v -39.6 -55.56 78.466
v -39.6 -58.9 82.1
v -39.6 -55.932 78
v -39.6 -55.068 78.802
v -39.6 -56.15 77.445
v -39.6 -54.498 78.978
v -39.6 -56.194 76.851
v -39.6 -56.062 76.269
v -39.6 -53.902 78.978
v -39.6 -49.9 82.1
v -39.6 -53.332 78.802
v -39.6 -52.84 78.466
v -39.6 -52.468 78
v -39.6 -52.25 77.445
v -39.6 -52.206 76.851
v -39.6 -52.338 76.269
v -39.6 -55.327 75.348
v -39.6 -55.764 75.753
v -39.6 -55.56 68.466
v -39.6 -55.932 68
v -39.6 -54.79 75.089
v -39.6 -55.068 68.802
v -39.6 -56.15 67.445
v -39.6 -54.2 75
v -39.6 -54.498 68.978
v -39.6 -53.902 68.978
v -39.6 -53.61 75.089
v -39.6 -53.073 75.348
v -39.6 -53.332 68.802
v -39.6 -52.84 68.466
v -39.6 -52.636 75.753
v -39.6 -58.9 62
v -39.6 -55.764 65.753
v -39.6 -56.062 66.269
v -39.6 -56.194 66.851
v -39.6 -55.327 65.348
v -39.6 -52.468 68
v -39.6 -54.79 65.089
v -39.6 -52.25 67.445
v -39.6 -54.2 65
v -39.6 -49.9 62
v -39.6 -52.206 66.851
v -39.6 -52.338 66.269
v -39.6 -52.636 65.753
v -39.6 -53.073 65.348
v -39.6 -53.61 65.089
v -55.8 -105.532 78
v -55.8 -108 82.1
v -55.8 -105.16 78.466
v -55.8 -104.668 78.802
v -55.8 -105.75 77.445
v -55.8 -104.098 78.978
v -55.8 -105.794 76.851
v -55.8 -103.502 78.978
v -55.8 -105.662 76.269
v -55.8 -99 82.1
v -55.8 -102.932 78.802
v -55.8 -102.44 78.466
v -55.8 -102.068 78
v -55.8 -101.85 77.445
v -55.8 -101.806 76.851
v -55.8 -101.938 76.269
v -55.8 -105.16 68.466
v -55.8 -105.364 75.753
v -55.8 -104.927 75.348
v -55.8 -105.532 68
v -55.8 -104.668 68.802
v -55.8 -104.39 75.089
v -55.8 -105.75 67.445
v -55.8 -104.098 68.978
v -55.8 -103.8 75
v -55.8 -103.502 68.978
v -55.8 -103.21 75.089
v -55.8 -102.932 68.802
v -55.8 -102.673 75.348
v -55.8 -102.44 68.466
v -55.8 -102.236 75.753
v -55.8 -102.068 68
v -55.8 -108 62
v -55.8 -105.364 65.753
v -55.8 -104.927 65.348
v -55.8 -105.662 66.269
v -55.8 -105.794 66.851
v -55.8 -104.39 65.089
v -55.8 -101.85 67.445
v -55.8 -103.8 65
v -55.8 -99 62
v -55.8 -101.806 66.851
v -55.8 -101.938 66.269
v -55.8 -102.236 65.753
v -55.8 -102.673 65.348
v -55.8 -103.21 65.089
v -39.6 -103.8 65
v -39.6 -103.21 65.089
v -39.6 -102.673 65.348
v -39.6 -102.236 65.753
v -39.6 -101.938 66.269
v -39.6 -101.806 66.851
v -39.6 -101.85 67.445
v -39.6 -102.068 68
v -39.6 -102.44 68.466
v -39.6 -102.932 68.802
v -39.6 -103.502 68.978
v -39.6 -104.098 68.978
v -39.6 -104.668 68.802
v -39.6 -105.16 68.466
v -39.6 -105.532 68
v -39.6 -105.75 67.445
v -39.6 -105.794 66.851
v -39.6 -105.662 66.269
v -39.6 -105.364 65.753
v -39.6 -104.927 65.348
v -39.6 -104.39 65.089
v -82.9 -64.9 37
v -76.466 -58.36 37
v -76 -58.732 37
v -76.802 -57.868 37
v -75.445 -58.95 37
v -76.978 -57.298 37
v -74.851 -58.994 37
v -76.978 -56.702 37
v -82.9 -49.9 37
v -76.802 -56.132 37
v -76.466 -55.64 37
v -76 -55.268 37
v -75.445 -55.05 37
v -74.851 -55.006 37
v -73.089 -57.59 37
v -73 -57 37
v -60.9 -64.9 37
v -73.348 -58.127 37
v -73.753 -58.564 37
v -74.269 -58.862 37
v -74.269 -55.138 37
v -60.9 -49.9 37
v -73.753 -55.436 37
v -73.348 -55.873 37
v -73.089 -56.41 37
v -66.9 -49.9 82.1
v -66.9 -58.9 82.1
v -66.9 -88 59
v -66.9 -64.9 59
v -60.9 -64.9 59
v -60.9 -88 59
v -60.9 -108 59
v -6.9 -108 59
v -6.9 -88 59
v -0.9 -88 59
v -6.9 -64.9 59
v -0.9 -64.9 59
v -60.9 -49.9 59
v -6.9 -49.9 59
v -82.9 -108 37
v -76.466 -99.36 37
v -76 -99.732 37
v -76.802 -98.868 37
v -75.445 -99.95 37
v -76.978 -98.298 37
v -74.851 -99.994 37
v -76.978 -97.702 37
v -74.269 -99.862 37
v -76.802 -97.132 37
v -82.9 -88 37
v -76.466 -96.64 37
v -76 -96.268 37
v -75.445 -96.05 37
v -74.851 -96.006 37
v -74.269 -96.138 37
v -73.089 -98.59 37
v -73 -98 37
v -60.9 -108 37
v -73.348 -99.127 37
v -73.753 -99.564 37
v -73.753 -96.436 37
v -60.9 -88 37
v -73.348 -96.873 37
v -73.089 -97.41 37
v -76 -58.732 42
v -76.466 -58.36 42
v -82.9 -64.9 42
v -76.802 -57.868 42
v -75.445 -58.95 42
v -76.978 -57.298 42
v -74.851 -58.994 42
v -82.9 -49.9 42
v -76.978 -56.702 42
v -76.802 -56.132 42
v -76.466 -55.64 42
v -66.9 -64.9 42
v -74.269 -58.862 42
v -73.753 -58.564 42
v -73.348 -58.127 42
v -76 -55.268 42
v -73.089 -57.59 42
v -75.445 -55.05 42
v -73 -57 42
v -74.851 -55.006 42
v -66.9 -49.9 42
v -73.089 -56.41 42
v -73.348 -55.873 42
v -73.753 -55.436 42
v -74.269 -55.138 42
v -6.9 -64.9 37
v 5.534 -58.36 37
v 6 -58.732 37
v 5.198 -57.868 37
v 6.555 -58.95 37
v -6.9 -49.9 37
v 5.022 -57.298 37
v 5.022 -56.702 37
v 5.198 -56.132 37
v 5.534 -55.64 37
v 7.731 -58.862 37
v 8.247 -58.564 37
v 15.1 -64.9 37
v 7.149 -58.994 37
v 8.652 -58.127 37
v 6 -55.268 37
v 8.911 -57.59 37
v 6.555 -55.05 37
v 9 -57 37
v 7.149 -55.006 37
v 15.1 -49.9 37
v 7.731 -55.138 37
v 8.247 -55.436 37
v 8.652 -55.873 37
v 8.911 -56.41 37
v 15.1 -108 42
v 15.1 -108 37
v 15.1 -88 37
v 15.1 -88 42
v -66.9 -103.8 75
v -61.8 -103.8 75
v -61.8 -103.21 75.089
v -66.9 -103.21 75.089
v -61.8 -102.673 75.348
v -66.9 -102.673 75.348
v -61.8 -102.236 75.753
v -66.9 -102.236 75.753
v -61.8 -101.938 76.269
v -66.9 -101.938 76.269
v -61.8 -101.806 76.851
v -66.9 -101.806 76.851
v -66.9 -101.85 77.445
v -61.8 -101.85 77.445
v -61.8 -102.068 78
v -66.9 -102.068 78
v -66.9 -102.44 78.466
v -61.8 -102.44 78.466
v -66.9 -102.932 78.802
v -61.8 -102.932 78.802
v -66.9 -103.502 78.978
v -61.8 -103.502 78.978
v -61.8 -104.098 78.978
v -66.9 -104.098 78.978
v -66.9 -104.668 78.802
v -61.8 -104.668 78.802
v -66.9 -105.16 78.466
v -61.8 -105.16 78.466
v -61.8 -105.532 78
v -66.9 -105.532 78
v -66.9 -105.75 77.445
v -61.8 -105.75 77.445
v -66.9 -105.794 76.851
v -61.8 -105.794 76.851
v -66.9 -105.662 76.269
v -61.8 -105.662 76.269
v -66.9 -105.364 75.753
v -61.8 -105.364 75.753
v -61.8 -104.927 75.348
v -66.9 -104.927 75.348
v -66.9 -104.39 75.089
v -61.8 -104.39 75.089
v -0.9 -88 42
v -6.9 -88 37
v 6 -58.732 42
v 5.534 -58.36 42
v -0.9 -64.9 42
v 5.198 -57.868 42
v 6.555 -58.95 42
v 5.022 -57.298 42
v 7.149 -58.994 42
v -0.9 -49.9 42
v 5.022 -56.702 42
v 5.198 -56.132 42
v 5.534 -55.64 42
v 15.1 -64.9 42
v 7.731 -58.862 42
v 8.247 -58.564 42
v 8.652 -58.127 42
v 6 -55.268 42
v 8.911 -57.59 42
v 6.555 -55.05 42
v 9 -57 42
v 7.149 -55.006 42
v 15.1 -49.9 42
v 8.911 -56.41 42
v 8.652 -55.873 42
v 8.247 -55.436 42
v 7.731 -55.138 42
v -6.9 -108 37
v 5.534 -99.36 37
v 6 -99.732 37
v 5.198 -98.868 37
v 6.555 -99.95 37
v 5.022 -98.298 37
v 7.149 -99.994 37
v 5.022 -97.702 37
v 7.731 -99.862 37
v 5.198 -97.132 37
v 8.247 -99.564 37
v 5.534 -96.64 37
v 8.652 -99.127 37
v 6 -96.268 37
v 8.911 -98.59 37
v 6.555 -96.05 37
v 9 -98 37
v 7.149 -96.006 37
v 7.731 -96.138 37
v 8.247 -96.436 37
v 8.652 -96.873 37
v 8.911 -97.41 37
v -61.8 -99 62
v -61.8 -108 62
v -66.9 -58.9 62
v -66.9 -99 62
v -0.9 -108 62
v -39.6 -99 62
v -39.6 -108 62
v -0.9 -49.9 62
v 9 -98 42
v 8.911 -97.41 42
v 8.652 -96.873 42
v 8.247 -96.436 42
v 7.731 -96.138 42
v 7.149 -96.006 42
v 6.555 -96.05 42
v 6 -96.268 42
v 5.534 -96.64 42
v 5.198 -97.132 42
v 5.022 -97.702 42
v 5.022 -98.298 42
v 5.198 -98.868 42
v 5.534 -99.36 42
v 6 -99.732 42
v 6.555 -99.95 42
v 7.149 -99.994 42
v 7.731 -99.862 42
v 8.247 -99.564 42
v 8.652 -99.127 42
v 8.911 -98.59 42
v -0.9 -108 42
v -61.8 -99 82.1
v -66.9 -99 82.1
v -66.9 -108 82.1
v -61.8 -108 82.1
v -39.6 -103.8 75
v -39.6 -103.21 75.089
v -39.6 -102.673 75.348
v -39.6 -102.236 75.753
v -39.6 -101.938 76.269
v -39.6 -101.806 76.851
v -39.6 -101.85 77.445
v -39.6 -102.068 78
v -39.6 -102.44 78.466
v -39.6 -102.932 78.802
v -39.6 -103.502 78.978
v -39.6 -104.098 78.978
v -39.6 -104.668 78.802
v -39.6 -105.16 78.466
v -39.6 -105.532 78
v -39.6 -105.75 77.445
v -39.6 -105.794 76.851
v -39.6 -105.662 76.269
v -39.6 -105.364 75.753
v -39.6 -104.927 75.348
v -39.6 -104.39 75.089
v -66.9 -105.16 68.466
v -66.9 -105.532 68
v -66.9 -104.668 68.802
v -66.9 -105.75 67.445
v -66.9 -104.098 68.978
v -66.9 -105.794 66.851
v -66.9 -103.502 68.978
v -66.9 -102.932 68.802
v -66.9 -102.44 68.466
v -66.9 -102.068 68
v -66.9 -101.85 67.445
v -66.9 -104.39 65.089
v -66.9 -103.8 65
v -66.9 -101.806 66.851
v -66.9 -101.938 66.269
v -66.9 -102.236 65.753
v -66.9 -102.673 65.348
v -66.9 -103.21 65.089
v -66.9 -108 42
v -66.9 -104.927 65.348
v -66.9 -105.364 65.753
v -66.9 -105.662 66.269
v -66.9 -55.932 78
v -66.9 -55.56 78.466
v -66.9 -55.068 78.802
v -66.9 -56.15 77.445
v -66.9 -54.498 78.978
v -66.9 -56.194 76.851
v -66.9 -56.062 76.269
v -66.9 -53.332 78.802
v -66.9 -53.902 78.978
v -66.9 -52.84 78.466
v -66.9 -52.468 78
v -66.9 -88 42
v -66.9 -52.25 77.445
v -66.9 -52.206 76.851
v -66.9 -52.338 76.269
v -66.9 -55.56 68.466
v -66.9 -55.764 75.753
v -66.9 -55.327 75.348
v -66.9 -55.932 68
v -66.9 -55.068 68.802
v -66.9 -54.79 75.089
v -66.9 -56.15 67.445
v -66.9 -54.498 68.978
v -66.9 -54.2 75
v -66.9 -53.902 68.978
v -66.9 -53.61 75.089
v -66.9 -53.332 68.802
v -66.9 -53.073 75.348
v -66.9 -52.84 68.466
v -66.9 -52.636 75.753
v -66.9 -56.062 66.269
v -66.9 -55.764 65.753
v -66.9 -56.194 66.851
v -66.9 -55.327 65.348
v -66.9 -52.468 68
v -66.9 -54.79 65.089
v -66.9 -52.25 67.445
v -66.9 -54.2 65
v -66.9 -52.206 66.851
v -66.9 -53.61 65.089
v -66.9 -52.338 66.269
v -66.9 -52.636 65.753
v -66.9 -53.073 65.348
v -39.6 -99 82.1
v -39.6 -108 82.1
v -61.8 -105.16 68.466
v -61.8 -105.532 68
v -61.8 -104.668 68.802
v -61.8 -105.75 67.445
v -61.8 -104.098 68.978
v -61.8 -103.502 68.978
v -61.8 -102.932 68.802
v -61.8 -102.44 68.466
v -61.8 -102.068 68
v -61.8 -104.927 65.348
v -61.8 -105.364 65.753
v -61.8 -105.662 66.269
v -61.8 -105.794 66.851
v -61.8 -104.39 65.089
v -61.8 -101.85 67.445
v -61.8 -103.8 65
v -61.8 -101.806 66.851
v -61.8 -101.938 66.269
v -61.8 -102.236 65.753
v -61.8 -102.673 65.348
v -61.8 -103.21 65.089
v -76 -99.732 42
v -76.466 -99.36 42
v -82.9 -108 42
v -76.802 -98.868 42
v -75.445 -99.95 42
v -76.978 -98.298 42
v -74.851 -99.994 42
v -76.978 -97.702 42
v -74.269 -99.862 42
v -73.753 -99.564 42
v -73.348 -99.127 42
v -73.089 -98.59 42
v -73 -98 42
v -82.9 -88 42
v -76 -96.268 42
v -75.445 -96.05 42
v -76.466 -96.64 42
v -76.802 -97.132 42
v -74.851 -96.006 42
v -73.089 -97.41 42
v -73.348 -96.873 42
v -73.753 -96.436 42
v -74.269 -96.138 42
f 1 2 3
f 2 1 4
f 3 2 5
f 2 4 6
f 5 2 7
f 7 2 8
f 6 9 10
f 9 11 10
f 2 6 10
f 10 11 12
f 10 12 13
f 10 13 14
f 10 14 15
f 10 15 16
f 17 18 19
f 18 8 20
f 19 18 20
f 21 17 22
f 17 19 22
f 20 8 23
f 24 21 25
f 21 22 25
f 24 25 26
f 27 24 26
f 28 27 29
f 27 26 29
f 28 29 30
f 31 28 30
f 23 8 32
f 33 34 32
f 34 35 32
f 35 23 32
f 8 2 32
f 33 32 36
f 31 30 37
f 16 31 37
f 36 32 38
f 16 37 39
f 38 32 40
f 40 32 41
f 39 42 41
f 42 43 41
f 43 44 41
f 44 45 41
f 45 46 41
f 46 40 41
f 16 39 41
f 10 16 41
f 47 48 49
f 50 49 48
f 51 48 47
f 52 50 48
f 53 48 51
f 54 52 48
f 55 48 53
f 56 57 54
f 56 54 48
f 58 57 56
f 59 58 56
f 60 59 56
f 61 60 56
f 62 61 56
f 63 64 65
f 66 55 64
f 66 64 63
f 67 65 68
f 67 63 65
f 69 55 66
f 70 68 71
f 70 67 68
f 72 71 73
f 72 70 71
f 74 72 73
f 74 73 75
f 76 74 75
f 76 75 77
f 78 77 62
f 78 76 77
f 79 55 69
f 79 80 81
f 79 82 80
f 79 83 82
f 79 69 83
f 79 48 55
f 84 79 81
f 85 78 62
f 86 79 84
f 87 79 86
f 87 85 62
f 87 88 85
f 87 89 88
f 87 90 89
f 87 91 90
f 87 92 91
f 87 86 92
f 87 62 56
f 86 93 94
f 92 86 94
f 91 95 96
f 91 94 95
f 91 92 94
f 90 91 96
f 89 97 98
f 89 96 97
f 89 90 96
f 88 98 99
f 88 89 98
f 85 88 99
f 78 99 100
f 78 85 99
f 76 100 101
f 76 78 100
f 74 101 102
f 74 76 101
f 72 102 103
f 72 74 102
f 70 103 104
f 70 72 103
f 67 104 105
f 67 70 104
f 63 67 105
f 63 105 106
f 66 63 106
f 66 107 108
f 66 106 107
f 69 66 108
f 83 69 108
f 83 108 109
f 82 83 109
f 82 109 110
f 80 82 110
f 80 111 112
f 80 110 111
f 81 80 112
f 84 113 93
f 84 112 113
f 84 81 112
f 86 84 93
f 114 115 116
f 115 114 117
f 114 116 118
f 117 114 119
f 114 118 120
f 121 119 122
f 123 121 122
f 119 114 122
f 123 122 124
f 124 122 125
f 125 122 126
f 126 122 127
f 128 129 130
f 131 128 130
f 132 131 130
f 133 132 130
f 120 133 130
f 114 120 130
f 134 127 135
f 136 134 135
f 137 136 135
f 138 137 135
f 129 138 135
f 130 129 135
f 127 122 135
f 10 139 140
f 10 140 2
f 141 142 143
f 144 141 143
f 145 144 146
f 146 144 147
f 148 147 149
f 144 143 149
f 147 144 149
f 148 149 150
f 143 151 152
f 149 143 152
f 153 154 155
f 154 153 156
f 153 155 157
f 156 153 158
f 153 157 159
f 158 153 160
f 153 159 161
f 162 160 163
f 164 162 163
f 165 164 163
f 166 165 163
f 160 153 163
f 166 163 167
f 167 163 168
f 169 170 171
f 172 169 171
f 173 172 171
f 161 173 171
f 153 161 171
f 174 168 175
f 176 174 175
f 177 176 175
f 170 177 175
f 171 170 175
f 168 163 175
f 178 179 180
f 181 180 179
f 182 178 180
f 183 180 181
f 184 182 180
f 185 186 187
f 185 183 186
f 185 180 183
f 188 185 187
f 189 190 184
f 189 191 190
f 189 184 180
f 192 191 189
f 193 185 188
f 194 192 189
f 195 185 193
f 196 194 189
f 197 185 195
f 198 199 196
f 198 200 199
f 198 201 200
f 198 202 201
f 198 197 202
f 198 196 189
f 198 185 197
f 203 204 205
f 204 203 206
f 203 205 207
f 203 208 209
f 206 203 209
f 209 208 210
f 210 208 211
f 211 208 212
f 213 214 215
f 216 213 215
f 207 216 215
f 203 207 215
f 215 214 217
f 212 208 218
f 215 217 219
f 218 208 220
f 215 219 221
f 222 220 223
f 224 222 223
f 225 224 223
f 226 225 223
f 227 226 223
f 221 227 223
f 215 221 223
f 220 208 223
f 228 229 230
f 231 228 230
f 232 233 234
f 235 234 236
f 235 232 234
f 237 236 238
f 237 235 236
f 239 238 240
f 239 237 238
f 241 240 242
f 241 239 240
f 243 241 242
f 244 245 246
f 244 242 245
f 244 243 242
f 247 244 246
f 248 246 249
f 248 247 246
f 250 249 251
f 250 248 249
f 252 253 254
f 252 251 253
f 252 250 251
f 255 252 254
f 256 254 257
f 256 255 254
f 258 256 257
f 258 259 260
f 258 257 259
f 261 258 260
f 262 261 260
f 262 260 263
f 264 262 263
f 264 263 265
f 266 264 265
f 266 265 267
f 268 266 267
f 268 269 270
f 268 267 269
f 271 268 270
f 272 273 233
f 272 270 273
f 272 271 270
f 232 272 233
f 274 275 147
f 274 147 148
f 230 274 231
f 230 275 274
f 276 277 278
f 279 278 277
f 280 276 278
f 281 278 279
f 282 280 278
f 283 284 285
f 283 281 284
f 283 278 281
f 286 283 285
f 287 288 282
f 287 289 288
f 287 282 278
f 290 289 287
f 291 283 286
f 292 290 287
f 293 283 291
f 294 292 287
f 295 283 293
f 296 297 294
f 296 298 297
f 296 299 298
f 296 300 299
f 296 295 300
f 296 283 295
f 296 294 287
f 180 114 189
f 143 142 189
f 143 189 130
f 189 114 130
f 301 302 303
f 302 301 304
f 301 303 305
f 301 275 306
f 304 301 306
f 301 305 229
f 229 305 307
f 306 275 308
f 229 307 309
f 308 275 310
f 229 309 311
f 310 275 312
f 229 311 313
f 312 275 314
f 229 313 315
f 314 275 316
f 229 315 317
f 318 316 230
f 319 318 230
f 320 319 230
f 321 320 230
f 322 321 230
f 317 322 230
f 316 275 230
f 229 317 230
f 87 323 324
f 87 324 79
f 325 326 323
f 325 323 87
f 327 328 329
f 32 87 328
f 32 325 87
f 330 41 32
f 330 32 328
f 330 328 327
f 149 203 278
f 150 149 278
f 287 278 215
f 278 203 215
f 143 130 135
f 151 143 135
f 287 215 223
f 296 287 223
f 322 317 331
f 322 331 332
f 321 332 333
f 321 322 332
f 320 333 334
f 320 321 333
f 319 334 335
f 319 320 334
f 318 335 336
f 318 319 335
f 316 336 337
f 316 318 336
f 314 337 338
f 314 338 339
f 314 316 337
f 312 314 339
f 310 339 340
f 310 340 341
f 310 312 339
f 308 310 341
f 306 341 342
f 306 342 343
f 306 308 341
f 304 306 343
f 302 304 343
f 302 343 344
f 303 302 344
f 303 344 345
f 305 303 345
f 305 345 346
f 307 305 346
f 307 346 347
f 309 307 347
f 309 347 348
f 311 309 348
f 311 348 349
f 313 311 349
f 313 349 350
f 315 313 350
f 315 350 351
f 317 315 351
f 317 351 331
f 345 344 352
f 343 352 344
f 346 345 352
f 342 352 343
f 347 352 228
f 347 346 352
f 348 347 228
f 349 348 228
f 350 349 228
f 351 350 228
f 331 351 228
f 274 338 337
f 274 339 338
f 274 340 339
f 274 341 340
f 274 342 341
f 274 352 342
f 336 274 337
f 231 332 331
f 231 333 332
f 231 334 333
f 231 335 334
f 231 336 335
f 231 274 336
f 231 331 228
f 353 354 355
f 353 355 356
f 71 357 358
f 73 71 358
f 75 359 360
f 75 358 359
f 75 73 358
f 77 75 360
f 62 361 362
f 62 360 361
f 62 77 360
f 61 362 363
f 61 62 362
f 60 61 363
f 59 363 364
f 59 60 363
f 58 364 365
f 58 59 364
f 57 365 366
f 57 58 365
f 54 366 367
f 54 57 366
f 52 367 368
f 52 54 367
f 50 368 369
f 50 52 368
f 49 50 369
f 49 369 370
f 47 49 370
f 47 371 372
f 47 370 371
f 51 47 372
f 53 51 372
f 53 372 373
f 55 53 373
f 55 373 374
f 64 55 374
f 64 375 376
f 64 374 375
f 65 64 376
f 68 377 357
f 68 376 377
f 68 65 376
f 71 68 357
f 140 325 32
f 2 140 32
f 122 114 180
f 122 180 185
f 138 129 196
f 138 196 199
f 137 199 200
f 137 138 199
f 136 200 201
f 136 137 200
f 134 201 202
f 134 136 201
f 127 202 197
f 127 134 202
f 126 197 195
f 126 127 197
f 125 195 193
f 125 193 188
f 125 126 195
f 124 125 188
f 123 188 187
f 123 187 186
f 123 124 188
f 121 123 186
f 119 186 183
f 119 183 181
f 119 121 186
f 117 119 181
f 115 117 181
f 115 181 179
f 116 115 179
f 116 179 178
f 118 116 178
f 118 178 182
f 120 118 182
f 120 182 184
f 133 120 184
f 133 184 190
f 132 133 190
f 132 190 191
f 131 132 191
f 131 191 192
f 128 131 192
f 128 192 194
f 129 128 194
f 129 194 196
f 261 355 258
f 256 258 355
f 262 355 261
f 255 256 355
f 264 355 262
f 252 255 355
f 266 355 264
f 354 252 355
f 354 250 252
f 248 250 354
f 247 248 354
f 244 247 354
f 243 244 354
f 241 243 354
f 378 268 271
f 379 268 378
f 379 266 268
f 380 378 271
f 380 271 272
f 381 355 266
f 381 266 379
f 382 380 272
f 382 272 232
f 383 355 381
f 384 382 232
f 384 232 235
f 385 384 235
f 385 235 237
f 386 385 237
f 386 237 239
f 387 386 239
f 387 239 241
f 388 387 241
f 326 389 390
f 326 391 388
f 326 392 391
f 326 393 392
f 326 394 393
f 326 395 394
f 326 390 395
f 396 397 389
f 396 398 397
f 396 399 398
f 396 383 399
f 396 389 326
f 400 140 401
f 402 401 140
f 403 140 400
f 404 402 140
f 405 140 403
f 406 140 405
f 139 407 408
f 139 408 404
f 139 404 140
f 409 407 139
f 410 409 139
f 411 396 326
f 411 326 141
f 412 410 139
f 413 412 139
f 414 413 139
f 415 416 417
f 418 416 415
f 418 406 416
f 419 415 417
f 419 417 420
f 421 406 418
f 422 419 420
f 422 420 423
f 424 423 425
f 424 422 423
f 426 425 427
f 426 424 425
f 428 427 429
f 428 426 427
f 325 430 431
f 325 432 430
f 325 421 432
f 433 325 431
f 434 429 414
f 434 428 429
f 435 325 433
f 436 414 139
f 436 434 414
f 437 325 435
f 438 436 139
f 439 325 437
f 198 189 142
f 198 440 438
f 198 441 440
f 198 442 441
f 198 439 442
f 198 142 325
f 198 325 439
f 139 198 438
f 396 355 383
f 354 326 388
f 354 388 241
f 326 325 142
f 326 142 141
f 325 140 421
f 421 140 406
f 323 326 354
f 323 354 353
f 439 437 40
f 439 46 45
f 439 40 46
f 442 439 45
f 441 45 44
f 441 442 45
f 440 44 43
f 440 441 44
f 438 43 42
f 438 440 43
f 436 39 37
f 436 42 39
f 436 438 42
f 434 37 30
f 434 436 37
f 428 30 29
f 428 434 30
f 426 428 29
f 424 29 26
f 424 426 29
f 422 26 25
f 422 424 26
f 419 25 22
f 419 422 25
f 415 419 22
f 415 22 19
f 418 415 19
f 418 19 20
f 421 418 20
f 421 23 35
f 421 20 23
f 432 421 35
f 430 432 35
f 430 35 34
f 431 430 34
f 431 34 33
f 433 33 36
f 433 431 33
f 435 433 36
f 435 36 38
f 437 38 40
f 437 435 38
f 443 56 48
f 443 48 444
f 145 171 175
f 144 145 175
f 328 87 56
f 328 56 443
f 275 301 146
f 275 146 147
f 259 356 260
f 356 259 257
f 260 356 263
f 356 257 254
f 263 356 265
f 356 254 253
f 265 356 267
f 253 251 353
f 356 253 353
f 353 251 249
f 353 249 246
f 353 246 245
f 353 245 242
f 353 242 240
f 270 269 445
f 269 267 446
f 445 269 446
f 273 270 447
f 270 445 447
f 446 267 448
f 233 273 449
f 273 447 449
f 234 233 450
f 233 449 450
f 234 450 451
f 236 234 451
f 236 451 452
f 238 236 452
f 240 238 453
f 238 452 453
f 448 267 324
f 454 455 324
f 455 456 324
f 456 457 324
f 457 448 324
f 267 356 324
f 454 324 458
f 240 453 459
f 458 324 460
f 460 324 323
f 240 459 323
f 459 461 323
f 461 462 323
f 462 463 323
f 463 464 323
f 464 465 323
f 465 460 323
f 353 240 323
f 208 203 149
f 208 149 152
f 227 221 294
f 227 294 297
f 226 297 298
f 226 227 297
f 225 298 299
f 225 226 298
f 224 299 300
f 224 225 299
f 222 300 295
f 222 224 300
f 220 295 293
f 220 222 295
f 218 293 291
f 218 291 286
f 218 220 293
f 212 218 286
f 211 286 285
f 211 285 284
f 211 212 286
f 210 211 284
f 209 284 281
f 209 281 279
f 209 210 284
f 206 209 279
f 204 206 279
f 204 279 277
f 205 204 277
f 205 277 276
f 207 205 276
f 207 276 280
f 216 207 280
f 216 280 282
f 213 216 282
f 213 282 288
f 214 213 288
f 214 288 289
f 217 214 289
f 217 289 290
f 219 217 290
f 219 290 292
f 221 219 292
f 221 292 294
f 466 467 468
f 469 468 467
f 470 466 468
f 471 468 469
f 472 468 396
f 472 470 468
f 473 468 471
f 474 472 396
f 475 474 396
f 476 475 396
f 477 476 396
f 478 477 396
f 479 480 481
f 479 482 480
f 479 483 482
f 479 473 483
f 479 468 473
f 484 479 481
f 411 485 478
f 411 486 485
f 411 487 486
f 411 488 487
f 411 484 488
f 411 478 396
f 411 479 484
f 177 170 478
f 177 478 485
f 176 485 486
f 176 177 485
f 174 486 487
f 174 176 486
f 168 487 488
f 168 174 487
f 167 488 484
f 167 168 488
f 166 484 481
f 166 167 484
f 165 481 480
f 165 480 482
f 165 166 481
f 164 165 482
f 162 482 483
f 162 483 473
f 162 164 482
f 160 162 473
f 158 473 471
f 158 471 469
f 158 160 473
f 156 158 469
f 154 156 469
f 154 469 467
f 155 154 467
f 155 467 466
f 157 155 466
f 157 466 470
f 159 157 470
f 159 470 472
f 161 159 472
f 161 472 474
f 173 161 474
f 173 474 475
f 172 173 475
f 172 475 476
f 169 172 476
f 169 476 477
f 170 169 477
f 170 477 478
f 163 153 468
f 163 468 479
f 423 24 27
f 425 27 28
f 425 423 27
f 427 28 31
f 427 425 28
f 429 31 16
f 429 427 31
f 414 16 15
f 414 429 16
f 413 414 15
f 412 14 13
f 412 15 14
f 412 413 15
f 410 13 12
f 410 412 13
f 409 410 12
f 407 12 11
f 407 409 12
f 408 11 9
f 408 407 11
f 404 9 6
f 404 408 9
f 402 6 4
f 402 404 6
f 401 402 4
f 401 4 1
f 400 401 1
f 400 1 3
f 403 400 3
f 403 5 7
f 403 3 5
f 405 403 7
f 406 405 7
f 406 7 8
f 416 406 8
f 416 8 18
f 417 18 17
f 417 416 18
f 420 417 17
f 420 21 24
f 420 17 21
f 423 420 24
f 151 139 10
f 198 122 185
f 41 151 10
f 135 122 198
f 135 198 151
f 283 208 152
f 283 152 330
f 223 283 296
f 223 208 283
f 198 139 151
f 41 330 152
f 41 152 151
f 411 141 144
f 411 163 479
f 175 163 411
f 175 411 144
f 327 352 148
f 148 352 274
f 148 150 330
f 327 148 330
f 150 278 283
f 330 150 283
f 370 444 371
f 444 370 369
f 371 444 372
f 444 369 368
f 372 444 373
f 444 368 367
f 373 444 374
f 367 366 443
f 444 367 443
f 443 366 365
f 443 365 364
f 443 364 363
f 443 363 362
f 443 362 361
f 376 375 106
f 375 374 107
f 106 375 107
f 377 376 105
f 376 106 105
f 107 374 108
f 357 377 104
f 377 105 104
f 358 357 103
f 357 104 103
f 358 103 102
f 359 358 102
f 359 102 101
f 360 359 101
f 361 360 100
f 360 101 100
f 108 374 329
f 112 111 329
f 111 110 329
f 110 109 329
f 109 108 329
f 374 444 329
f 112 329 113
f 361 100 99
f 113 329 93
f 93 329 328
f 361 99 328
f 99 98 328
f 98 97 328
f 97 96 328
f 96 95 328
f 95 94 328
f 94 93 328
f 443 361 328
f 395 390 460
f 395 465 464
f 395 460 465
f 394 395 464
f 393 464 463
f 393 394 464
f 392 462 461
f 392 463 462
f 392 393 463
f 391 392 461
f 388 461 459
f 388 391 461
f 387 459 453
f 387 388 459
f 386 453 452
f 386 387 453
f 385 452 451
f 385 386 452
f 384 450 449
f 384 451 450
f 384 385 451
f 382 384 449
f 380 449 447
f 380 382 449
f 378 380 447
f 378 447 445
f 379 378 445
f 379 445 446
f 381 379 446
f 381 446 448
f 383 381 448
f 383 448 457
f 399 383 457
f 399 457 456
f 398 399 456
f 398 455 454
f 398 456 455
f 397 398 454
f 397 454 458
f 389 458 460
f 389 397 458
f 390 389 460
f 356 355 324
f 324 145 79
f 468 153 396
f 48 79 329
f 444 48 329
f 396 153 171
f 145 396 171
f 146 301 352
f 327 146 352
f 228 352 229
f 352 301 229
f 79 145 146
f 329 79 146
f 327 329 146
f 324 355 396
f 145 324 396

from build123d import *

# Parameters (mm, degrees)
CYLINDER324_R     = 2
CYLINDER324_DEPTH = 47
CYLINDER323_R     = 2
CYLINDER323_DEPTH = 47
BOX411_W          = 6
BOX411_H          = 15
BOX411_DEPTH      = 25
BOX409_W          = 6
BOX409_H          = 15
BOX409_DEPTH      = 25
BOX410_W          = 16
BOX410_H          = 15
BOX410_DEPTH      = 5
BOX412_W          = 16
BOX412_H          = 15
BOX412_DEPTH      = 5
BOX430_W          = 6
BOX430_H          = 9
BOX430_DEPTH      = 20.1
CYLINDER180_R     = 2
CYLINDER180_DEPTH = 33
CYLINDER179_R     = 2
CYLINDER179_DEPTH = 30
CYLINDER182_R     = 2
CYLINDER182_DEPTH = 33
CYLINDER181_R     = 2
CYLINDER181_DEPTH = 30
BOX281_W          = 27.3
BOX281_H          = 9
BOX281_DEPTH      = 20.1
BOX408_W          = 27.3
BOX408_H          = 9
BOX408_DEPTH      = 20.1
BOX283_W          = 66
BOX283_H          = 58.1
BOX283_DEPTH      = 3
CYLINDER326_R     = 2
CYLINDER326_DEPTH = 47
CYLINDER325_R     = 2
CYLINDER325_DEPTH = 47
BOX286_W          = 6
BOX286_H          = 20
BOX286_DEPTH      = 25
BOX407_W          = 16
BOX407_H          = 20
BOX407_DEPTH      = 5
BOX288_W          = 6
BOX288_H          = 20
BOX288_DEPTH      = 25
BOX406_W          = 16
BOX406_H          = 20
BOX406_DEPTH      = 5


with BuildPart() as cylinder324:
    # Cylinder324 → Cylinder324 (new body)
    with BuildSketch(Plane(origin=(-75, -98, -5), x_dir=(1, 0, 0), z_dir=(0, 0, 1))):
        Circle(CYLINDER324_R)
    extrude(amount=CYLINDER324_DEPTH)


with BuildPart() as fusion314:
    # Cylinder323 → Cylinder323 (new body)
    with BuildSketch(Plane(origin=(7, -98, -5), x_dir=(1, 0, 0), z_dir=(0, 0, 1))):
        Circle(CYLINDER323_R)
    extrude(amount=CYLINDER323_DEPTH)

    # Fusion314: union Cylinder324
    add(cylinder324.part)


with BuildPart() as fusion314_1:
    # Fusion314 placement: moved
    add(fusion314.part.moved(Location((0, 41, 0))))


with BuildPart() as box411:
    # Box411 → Box411 (new body)
    with BuildSketch(Plane(origin=(-6.9, -64.9, 37), x_dir=(1, 0, 0), z_dir=(0, 0, 1))):
        with Locations((3, 7.5)):
            Rectangle(BOX411_W, BOX411_H)
    extrude(amount=BOX411_DEPTH)


with BuildPart() as box409:
    # Box409 → Box409 (new body)
    with BuildSketch(Plane(origin=(-66.9, -64.9, 37), x_dir=(1, 0, 0), z_dir=(0, 0, 1))):
        with Locations((3, 7.5)):
            Rectangle(BOX409_W, BOX409_H)
    extrude(amount=BOX409_DEPTH)


with BuildPart() as box410:
    # Box410 → Box410 (new body)
    with BuildSketch(Plane(origin=(-82.9, -64.9, 37), x_dir=(1, 0, 0), z_dir=(0, 0, 1))):
        with Locations((8, 7.5)):
            Rectangle(BOX410_W, BOX410_H)
    extrude(amount=BOX410_DEPTH)


with BuildPart() as cut338:
    # Box412 → Box412 (new body)
    with BuildSketch(Plane(origin=(-0.9, -64.9, 37), x_dir=(1, 0, 0), z_dir=(0, 0, 1))):
        with Locations((8, 7.5)):
            Rectangle(BOX412_W, BOX412_H)
    extrude(amount=BOX412_DEPTH)

    # Fusion322: union Box411, Box409, Box410
    add(box411.part)
    add(box409.part)
    add(box410.part)

    # Cut338: cut Fusion314
    add(fusion314_1.part, mode=Mode.SUBTRACT)


with BuildPart() as box430:
    # Box430 → Box430 (new body)
    with BuildSketch(Plane(origin=(-66.5, -108, 62), x_dir=(1, 0, 0), z_dir=(0, 0, 1))):
        with Locations((3, 4.5)):
            Rectangle(BOX430_W, BOX430_H)
    extrude(amount=BOX430_DEPTH)


with BuildPart() as cylinder180:
    # Cylinder180 → Cylinder180 (new body)
    with BuildSketch(Plane(origin=(-74.6, -105.8, 63), x_dir=(0, 0, -1), z_dir=(1, 0, 0))):
        Circle(CYLINDER180_R)
    extrude(amount=CYLINDER180_DEPTH)


with BuildPart() as fusion247:
    # Cylinder179 → Cylinder179 (new body)
    with BuildSketch(Plane(origin=(-71.6, -105.8, 73), x_dir=(0, 0, -1), z_dir=(1, 0, 0))):
        Circle(CYLINDER179_R)
    extrude(amount=CYLINDER179_DEPTH)

    # Fusion247: union Cylinder180
    add(cylinder180.part)


with BuildPart() as fusion247_1:
    # Fusion247 placement: moved
    add(fusion247.part.moved(Location((0, 2, 4))))


with BuildPart() as cylinder182:
    # Cylinder182 → Cylinder182 (new body)
    with BuildSketch(Plane(origin=(-74.6, -56.2, 63), x_dir=(0, 0, -1), z_dir=(1, 0, 0))):
        Circle(CYLINDER182_R)
    extrude(amount=CYLINDER182_DEPTH)


with BuildPart() as fusion252:
    # Cylinder181 → Cylinder181 (new body)
    with BuildSketch(Plane(origin=(-71.6, -56.2, 73), x_dir=(0, 0, -1), z_dir=(1, 0, 0))):
        Circle(CYLINDER181_R)
    extrude(amount=CYLINDER181_DEPTH)

    # Fusion246: union Cylinder182
    add(cylinder182.part)


with BuildPart() as fusion252_1:
    # Fusion246 placement: moved
    add(fusion252.part.moved(Location((0, 2, 4))))

    # Fusion252: union Fusion247
    add(fusion247_1.part)


with BuildPart() as box281:
    # Box281 → Box281 (new body)
    with BuildSketch(Plane(origin=(-71.6, -108, 62), x_dir=(1, 0, 0), z_dir=(0, 0, 1))):
        with Locations((13.65, 4.5)):
            Rectangle(BOX281_W, BOX281_H)
    extrude(amount=BOX281_DEPTH)


with BuildPart() as box408:
    # Box408 → Box408 (new body)
    with BuildSketch(Plane(origin=(-71.6, -58.9, 62), x_dir=(1, 0, 0), z_dir=(0, 0, 1))):
        with Locations((13.65, 4.5)):
            Rectangle(BOX408_W, BOX408_H)
    extrude(amount=BOX408_DEPTH)


with BuildPart() as cut336:
    # Box283 → Box283 (new body)
    with BuildSketch(Plane(origin=(-71.6, -108, 59), x_dir=(1, 0, 0), z_dir=(0, 0, 1))):
        with Locations((33, 29.05)):
            Rectangle(BOX283_W, BOX283_H)
    extrude(amount=BOX283_DEPTH)

    # Fusion251: union Box281, Box408
    add(box281.part)
    add(box408.part)

    # Cut283: cut Fusion252
    add(fusion252_1.part, mode=Mode.SUBTRACT)

    # Cut336: cut Box430
    add(box430.part, mode=Mode.SUBTRACT)


with BuildPart() as cut336_1:
    # Cut336 placement: moved
    add(cut336.part.moved(Location((4.7, 0, 0))))


with BuildPart() as cylinder326:
    # Cylinder326 → Cylinder326 (new body)
    with BuildSketch(Plane(origin=(-75, -98, -5), x_dir=(1, 0, 0), z_dir=(0, 0, 1))):
        Circle(CYLINDER326_R)
    extrude(amount=CYLINDER326_DEPTH)


with BuildPart() as fusion315:
    # Cylinder325 → Cylinder325 (new body)
    with BuildSketch(Plane(origin=(7, -98, -5), x_dir=(1, 0, 0), z_dir=(0, 0, 1))):
        Circle(CYLINDER325_R)
    extrude(amount=CYLINDER325_DEPTH)

    # Fusion315: union Cylinder326
    add(cylinder326.part)


with BuildPart() as box286:
    # Box286 → Box286 (new body)
    with BuildSketch(Plane(origin=(-66.9, -108, 37), x_dir=(1, 0, 0), z_dir=(0, 0, 1))):
        with Locations((3, 10)):
            Rectangle(BOX286_W, BOX286_H)
    extrude(amount=BOX286_DEPTH)


with BuildPart() as box407:
    # Box407 → Box407 (new body)
    with BuildSketch(Plane(origin=(-0.9, -108, 37), x_dir=(1, 0, 0), z_dir=(0, 0, 1))):
        with Locations((8, 10)):
            Rectangle(BOX407_W, BOX407_H)
    extrude(amount=BOX407_DEPTH)


with BuildPart() as box288:
    # Box288 → Box288 (new body)
    with BuildSketch(Plane(origin=(-6.9, -108, 37), x_dir=(1, 0, 0), z_dir=(0, 0, 1))):
        with Locations((3, 10)):
            Rectangle(BOX288_W, BOX288_H)
    extrude(amount=BOX288_DEPTH)


with BuildPart() as fusion324:
    # Box406 → Box406 (new body)
    with BuildSketch(Plane(origin=(-82.9, -108, 37), x_dir=(1, 0, 0), z_dir=(0, 0, 1))):
        with Locations((8, 10)):
            Rectangle(BOX406_W, BOX406_H)
    extrude(amount=BOX406_DEPTH)

    # Fusion249: union Box286, Box407, Box288
    add(box286.part)
    add(box407.part)
    add(box288.part)

    # Cut337: cut Fusion315
    add(fusion315.part, mode=Mode.SUBTRACT)

    # Fusion324: union Cut338, Cut336
    add(cut338.part)
    add(cut336_1.part)


solid = fusion324.part
